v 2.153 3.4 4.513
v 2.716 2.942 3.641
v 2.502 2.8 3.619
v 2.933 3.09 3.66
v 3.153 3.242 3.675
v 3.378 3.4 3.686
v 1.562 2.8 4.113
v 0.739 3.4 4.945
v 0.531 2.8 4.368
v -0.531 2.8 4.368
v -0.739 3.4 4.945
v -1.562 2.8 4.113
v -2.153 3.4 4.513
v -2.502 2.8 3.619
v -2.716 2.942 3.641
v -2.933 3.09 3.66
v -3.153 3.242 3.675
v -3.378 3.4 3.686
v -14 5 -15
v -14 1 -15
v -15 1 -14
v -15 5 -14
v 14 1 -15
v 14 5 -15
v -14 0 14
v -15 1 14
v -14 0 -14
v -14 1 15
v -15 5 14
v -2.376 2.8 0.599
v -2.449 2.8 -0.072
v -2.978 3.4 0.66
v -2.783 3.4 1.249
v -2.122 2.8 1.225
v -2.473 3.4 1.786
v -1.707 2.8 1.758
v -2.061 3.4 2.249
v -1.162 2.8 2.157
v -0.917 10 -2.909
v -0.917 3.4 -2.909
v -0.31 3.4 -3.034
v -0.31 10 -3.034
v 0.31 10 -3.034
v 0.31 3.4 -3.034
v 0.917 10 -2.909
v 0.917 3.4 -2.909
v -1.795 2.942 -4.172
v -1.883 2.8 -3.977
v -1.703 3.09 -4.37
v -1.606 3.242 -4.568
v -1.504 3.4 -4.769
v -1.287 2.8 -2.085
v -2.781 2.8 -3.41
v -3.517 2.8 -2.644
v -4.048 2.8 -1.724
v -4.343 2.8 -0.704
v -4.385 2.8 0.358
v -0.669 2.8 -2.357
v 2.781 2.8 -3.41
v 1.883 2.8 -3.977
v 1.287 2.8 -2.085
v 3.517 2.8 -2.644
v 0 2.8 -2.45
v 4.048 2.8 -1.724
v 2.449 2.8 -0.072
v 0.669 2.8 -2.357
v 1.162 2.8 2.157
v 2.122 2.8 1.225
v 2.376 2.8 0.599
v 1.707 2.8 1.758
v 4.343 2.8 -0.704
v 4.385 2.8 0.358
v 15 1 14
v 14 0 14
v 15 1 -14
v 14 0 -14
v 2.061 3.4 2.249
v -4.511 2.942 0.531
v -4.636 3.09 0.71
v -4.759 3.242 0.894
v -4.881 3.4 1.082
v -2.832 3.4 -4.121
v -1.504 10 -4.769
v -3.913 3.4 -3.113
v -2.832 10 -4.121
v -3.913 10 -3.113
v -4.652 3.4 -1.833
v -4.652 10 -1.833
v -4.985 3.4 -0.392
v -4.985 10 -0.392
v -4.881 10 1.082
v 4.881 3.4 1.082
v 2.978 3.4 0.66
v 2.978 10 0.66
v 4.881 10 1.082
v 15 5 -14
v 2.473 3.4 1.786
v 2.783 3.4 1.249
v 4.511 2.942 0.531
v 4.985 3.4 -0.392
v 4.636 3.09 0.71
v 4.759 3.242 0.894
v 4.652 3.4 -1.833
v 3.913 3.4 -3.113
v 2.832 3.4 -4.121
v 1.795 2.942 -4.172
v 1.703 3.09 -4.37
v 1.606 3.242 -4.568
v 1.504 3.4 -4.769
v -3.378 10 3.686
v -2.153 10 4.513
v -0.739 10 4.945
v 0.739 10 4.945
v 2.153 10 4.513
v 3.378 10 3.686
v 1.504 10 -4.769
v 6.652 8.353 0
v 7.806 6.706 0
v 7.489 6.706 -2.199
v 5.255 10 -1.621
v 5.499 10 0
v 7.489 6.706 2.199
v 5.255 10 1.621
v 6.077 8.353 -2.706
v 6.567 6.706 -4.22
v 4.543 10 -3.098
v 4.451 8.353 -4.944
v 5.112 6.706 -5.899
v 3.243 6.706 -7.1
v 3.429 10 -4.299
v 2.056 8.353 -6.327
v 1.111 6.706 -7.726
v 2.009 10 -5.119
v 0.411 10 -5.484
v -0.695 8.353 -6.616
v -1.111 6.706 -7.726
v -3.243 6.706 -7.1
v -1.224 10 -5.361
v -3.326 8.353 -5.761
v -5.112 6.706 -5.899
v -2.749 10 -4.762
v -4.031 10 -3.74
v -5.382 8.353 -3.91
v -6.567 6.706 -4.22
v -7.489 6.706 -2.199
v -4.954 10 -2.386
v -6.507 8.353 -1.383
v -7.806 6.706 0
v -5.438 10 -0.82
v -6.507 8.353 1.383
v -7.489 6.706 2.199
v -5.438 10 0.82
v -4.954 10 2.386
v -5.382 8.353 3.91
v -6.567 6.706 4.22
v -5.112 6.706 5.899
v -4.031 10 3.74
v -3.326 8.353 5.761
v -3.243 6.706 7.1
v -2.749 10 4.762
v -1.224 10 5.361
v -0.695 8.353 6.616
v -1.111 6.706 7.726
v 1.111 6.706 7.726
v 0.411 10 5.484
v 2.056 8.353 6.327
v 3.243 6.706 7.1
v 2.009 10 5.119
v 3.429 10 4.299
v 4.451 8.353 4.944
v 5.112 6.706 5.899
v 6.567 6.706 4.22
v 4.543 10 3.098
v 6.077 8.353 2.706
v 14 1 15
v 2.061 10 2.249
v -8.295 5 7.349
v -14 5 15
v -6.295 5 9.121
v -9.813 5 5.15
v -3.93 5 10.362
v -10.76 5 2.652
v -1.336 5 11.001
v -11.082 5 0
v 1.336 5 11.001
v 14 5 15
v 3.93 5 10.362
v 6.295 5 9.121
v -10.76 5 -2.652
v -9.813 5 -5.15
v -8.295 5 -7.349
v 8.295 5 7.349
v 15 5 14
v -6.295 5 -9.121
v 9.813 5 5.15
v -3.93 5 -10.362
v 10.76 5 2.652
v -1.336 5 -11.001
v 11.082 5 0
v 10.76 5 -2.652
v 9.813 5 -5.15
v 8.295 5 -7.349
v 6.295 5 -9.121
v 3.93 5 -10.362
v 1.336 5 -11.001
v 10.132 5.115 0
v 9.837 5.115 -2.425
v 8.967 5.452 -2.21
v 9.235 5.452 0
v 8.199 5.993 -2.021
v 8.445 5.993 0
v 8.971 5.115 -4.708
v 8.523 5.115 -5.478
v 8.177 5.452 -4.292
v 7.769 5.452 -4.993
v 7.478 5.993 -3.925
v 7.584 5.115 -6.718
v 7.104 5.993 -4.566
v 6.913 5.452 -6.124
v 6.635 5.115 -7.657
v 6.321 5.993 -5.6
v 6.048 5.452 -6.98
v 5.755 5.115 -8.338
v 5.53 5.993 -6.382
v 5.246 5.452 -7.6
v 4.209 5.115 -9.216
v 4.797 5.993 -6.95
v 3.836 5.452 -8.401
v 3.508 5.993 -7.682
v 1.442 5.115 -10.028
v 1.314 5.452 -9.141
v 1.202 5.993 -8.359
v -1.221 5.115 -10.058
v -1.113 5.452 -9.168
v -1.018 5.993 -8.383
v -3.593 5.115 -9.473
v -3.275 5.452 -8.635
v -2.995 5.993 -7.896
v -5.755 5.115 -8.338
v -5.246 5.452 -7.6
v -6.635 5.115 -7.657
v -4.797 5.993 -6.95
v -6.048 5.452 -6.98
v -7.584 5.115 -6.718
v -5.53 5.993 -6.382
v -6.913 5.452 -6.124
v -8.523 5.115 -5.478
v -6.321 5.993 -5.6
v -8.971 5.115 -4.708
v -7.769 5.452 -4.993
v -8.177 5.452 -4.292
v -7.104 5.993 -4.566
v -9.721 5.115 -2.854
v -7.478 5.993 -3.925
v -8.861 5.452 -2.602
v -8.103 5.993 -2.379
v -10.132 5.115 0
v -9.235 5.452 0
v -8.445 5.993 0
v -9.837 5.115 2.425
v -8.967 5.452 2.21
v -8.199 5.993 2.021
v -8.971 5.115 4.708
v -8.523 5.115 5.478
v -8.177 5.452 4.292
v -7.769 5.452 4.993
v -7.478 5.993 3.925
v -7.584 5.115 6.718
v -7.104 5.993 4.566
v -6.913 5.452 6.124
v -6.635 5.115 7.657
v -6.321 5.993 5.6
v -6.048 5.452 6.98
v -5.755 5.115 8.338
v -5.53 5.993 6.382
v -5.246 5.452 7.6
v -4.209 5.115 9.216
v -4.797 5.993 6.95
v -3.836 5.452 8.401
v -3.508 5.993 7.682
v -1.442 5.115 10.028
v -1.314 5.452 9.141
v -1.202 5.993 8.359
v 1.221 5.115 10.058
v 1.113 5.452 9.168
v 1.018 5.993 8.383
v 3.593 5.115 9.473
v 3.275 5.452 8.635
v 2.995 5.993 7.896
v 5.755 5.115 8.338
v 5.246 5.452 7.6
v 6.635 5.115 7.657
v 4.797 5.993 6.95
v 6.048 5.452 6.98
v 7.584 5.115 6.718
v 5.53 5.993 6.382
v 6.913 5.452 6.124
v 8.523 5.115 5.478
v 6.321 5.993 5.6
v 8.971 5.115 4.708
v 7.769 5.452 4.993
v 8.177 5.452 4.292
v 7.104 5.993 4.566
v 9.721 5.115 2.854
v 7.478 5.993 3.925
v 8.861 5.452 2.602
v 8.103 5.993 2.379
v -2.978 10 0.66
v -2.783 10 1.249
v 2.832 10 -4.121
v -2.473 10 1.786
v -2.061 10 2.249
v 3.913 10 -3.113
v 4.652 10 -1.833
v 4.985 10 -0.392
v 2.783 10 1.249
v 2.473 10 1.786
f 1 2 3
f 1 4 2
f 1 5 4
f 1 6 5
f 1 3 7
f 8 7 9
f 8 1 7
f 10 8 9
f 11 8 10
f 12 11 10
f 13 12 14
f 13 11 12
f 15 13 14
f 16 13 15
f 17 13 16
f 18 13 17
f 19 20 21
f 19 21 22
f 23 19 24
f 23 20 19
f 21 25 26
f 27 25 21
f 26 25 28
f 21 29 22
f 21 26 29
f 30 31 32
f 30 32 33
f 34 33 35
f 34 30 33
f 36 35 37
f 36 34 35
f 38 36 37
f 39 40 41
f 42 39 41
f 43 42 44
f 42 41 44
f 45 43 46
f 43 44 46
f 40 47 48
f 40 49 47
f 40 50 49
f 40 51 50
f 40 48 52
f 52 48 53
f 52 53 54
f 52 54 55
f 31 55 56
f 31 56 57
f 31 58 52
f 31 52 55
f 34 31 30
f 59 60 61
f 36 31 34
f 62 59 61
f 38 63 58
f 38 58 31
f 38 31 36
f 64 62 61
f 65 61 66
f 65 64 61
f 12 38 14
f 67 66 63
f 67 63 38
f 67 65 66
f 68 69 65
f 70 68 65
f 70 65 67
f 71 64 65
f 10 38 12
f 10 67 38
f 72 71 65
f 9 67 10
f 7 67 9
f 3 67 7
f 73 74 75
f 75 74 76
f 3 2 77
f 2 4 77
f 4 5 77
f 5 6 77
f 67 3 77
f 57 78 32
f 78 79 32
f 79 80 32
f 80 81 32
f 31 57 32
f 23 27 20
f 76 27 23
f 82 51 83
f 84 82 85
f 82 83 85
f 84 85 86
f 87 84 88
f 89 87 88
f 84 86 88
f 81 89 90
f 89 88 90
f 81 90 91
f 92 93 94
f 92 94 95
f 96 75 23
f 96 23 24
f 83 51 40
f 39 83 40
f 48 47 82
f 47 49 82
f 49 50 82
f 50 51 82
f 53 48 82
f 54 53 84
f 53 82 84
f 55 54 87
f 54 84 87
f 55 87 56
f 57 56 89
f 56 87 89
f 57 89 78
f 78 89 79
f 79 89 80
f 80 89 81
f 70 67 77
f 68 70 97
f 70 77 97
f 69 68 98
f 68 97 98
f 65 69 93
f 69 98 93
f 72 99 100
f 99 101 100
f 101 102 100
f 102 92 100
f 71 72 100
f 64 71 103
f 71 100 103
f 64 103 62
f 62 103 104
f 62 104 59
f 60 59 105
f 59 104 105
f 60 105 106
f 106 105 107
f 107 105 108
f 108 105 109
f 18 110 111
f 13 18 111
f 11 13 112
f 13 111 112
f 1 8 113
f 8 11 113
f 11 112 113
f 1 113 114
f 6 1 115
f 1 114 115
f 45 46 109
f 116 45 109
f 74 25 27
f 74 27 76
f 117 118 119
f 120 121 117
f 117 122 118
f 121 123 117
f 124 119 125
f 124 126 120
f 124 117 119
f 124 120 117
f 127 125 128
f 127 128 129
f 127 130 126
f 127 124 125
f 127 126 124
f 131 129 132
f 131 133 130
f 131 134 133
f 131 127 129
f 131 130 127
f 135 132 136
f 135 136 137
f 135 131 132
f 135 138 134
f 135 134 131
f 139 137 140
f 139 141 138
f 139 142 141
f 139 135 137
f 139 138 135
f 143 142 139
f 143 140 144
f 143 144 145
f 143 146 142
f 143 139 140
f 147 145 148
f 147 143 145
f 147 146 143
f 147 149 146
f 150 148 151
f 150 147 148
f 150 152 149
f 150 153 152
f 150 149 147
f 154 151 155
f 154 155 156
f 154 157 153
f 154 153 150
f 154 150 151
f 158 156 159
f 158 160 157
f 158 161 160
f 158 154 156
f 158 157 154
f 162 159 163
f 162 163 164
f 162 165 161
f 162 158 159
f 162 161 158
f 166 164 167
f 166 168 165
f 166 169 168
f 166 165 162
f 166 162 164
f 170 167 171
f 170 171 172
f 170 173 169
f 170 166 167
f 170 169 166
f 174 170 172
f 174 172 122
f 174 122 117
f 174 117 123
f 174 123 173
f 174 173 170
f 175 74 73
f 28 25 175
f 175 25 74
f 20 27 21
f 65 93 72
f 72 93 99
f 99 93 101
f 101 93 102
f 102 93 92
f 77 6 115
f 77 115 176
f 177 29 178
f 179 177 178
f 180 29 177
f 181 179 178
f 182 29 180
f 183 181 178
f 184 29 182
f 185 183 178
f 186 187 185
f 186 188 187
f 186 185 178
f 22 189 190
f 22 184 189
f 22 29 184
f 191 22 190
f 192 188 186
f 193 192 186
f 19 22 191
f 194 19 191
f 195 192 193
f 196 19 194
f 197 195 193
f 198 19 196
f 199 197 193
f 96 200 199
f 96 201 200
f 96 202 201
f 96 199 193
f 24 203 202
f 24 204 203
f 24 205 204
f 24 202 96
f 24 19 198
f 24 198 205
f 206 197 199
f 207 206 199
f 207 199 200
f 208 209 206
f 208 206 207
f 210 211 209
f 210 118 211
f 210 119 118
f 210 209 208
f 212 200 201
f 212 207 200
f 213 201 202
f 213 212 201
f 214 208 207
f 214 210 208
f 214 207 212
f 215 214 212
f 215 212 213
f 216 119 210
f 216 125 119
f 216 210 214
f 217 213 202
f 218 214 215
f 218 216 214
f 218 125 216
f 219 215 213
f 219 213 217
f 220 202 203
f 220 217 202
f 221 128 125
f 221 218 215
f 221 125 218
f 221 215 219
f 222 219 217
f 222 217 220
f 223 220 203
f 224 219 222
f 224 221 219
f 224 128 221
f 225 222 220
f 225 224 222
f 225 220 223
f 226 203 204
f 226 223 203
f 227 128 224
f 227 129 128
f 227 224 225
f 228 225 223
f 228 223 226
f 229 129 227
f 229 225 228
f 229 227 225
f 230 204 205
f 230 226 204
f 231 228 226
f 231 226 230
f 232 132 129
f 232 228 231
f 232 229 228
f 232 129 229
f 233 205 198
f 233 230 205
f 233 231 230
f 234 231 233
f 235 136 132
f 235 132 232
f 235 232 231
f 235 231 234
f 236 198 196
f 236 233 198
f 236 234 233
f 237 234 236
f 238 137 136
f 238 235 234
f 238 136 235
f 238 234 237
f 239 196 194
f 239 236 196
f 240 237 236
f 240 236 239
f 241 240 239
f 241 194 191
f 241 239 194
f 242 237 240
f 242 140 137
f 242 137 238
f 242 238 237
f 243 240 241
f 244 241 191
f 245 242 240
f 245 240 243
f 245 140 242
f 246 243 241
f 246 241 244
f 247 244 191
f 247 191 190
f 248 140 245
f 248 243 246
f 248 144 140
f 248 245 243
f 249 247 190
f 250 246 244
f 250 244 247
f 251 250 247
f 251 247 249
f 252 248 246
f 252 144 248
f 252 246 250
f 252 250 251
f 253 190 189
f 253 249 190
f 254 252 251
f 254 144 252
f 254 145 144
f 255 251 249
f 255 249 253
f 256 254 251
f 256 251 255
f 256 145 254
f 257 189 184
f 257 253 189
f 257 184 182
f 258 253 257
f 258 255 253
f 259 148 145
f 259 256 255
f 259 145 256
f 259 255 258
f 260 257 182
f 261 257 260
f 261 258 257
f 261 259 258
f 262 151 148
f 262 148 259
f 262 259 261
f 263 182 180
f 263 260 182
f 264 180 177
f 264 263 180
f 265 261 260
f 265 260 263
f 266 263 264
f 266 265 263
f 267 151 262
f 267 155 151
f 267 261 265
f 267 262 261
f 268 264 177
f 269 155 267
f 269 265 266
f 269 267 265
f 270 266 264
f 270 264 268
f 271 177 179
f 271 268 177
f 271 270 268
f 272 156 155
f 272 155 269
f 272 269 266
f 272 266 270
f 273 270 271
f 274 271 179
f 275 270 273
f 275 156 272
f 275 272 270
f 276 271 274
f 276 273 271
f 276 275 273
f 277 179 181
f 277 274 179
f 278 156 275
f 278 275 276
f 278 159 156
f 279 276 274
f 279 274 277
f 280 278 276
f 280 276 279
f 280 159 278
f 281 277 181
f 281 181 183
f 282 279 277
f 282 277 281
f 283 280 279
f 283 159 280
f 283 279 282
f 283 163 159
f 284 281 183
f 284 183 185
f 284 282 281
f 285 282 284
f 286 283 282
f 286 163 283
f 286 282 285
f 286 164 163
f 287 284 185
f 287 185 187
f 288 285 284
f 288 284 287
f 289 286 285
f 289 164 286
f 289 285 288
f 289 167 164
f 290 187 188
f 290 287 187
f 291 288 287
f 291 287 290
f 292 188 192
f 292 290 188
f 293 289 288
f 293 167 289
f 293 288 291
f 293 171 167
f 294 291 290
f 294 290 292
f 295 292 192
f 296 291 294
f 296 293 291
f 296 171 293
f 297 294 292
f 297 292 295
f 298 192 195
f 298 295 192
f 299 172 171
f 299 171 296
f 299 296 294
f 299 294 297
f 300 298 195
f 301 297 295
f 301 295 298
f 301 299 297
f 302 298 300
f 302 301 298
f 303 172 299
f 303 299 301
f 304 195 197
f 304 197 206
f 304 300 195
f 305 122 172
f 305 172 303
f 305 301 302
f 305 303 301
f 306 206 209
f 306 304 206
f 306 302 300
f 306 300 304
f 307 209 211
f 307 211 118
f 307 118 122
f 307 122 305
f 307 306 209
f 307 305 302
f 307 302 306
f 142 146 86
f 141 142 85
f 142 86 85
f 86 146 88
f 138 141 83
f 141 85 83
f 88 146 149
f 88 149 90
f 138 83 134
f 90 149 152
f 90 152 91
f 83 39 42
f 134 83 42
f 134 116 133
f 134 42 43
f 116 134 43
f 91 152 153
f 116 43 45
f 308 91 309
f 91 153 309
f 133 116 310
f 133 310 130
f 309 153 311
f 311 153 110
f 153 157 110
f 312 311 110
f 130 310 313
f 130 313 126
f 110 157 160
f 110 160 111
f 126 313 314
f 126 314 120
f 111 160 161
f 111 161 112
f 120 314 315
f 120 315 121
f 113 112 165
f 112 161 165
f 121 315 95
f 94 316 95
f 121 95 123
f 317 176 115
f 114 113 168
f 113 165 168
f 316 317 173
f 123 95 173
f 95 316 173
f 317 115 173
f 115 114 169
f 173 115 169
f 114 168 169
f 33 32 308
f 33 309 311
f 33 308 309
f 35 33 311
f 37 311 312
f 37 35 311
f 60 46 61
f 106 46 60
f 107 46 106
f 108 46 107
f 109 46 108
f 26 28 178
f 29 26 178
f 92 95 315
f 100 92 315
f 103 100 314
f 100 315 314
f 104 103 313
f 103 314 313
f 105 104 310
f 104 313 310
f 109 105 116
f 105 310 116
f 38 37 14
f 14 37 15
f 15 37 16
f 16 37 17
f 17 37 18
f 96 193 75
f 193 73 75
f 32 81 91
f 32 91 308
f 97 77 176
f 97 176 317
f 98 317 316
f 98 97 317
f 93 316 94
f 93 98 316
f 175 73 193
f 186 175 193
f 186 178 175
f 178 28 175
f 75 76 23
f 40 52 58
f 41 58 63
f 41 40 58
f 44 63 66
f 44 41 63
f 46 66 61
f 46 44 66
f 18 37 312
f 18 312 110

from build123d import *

# Parameters (mm, degrees)
SKETCH1_W           = 30
SKETCH1_H           = 30
BOSS_EXTRUDE1_DEPTH = 5
SKETCH2_R           = 9
BOSS_EXTRUDE2_DEPTH = 5.8
BOSS_EXTRUDE2_TAPER = 35
SKETCH4_R           = 5
CUT_EXTRUDE2_DEPTH  = 8
BOSS_EXTRUDE3_DEPTH = 7.5
CHAMFER1_SIZE       = 1
FILLET2_R           = 4
SKETCH6_W           = 30
SKETCH6_H           = 2
CUT_EXTRUDE3_DEPTH  = 36.210220534
CHAMFER2_SIZE       = 0.6


with BuildPart() as part:
    # Sketch1 → Boss-Extrude1 (new body)
    with BuildSketch(Plane(origin=(0, 0, 0), x_dir=(1, 0, 0), z_dir=(0, 1, 0))):
        Rectangle(SKETCH1_W, SKETCH1_H)
    extrude(amount=BOSS_EXTRUDE1_DEPTH)

    # Sketch2 → Boss-Extrude2 (add)
    with BuildSketch(Plane(origin=(0, 5, 0), x_dir=(1, 0, 0), z_dir=(0, 1, 0))):
        Circle(SKETCH2_R)
    extrude(amount=BOSS_EXTRUDE2_DEPTH, taper=BOSS_EXTRUDE2_TAPER)

    # Sketch4 → Cut-Extrude2 (cut)
    with BuildSketch(Plane(origin=(0, 10.8, 0), x_dir=(1, 0, 0), z_dir=(0, 1, 0))):
        with Locations(Location((0, 0, 0), (0, 0, 270))):
            Circle(SKETCH4_R)
    extrude(amount=-CUT_EXTRUDE2_DEPTH, mode=Mode.SUBTRACT)

    # Sketch5 → Boss-Extrude3 (add)
    with BuildSketch(Plane(origin=(0, 2.8, 0), x_dir=(1, 0, 0), z_dir=(0, 1, 0))):
        with BuildLine():
            Line((-1.533599577, 4.863956449), (-0.917152688, 2.9088367))
            ThreePointArc((-0.917152688, 2.9088367), (0, 3.05), (0.917152688, 2.9088367))
            Line((0.917152688, 2.9088367), (1.533599577, 4.863956449))
            ThreePointArc((1.533599577, 4.863956449), (0, 5.1), (-1.533599577, 4.863956449))
        make_face()
        with BuildLine():
            Line((3.445510059, -3.760114418), (2.060550133, -2.248695877))
            ThreePointArc((2.060550133, -2.248695877), (2.641377482, -1.525), (2.977702822, -0.660140823))
            Line((2.977702822, -0.660140823), (4.979109636, -1.103842031))
            ThreePointArc((4.979109636, -1.103842031), (4.416729559, -2.55), (3.445510059, -3.760114418))
        make_face()
        with BuildLine():
            Line((-4.979109636, -1.103842031), (-2.977702822, -0.660140823))
            ThreePointArc((-2.977702822, -0.660140823), (-2.641377482, -1.525), (-2.060550133, -2.248695877))
            Line((-2.060550133, -2.248695877), (-3.445510059, -3.760114418))
            ThreePointArc((-3.445510059, -3.760114418), (-4.416729559, -2.55), (-4.979109636, -1.103842031))
        make_face()
    extrude(amount=BOSS_EXTRUDE3_DEPTH)

    # Chamfer1
    chamfer1_edges = [part.edges().sort_by_distance(p)[0] for p in [
        (0, 0, 15),
        (-15, 0, 0),
        (0, 0, -15),
        (15, 0, 0),
        (15, 2.5, 15),
        (-15, 2.5, 15),
        (-15, 2.5, -15),
        (15, 2.5, -15),
    ]]
    chamfer(chamfer1_edges, length=CHAMFER1_SIZE)

    # Fillet2
    fillet2_edges = [part.edges().sort_by_distance(p)[0] for p in [
        (-9, 5, 0),
    ]]
    fillet(fillet2_edges, radius=FILLET2_R)

    # Sketch6 → Cut-Extrude3 (cut, through all)
    with BuildSketch(Plane.XY.offset(15)):
        with Locations((0, 11)):
            Rectangle(SKETCH6_W, SKETCH6_H)
    extrude(amount=-CUT_EXTRUDE3_DEPTH, mode=Mode.SUBTRACT)

    # Chamfer2
    chamfer2_edges = [part.edges().sort_by_distance(p)[0] for p in [
        (-4.330127019, 2.8, -2.5),
        (-1.210340843, 2.8, -3.838710727),
        (1.210340843, 2.8, -3.838710727),
        (0, 2.8, -3.05),
        (4.330127019, 2.8, -2.5),
        (3.929591429, 2.8, 0.871169446),
        (2.719250586, 2.8, 2.967541281),
        (2.641377482, 2.8, 1.525),
        (0, 2.8, 5),
        (-2.719250586, 2.8, 2.967541281),
        (-3.929591429, 2.8, 0.871169446),
        (-2.641377482, 2.8, 1.525),
    ]]
    chamfer(chamfer2_edges, length=CHAMFER2_SIZE)


solid = part.part
